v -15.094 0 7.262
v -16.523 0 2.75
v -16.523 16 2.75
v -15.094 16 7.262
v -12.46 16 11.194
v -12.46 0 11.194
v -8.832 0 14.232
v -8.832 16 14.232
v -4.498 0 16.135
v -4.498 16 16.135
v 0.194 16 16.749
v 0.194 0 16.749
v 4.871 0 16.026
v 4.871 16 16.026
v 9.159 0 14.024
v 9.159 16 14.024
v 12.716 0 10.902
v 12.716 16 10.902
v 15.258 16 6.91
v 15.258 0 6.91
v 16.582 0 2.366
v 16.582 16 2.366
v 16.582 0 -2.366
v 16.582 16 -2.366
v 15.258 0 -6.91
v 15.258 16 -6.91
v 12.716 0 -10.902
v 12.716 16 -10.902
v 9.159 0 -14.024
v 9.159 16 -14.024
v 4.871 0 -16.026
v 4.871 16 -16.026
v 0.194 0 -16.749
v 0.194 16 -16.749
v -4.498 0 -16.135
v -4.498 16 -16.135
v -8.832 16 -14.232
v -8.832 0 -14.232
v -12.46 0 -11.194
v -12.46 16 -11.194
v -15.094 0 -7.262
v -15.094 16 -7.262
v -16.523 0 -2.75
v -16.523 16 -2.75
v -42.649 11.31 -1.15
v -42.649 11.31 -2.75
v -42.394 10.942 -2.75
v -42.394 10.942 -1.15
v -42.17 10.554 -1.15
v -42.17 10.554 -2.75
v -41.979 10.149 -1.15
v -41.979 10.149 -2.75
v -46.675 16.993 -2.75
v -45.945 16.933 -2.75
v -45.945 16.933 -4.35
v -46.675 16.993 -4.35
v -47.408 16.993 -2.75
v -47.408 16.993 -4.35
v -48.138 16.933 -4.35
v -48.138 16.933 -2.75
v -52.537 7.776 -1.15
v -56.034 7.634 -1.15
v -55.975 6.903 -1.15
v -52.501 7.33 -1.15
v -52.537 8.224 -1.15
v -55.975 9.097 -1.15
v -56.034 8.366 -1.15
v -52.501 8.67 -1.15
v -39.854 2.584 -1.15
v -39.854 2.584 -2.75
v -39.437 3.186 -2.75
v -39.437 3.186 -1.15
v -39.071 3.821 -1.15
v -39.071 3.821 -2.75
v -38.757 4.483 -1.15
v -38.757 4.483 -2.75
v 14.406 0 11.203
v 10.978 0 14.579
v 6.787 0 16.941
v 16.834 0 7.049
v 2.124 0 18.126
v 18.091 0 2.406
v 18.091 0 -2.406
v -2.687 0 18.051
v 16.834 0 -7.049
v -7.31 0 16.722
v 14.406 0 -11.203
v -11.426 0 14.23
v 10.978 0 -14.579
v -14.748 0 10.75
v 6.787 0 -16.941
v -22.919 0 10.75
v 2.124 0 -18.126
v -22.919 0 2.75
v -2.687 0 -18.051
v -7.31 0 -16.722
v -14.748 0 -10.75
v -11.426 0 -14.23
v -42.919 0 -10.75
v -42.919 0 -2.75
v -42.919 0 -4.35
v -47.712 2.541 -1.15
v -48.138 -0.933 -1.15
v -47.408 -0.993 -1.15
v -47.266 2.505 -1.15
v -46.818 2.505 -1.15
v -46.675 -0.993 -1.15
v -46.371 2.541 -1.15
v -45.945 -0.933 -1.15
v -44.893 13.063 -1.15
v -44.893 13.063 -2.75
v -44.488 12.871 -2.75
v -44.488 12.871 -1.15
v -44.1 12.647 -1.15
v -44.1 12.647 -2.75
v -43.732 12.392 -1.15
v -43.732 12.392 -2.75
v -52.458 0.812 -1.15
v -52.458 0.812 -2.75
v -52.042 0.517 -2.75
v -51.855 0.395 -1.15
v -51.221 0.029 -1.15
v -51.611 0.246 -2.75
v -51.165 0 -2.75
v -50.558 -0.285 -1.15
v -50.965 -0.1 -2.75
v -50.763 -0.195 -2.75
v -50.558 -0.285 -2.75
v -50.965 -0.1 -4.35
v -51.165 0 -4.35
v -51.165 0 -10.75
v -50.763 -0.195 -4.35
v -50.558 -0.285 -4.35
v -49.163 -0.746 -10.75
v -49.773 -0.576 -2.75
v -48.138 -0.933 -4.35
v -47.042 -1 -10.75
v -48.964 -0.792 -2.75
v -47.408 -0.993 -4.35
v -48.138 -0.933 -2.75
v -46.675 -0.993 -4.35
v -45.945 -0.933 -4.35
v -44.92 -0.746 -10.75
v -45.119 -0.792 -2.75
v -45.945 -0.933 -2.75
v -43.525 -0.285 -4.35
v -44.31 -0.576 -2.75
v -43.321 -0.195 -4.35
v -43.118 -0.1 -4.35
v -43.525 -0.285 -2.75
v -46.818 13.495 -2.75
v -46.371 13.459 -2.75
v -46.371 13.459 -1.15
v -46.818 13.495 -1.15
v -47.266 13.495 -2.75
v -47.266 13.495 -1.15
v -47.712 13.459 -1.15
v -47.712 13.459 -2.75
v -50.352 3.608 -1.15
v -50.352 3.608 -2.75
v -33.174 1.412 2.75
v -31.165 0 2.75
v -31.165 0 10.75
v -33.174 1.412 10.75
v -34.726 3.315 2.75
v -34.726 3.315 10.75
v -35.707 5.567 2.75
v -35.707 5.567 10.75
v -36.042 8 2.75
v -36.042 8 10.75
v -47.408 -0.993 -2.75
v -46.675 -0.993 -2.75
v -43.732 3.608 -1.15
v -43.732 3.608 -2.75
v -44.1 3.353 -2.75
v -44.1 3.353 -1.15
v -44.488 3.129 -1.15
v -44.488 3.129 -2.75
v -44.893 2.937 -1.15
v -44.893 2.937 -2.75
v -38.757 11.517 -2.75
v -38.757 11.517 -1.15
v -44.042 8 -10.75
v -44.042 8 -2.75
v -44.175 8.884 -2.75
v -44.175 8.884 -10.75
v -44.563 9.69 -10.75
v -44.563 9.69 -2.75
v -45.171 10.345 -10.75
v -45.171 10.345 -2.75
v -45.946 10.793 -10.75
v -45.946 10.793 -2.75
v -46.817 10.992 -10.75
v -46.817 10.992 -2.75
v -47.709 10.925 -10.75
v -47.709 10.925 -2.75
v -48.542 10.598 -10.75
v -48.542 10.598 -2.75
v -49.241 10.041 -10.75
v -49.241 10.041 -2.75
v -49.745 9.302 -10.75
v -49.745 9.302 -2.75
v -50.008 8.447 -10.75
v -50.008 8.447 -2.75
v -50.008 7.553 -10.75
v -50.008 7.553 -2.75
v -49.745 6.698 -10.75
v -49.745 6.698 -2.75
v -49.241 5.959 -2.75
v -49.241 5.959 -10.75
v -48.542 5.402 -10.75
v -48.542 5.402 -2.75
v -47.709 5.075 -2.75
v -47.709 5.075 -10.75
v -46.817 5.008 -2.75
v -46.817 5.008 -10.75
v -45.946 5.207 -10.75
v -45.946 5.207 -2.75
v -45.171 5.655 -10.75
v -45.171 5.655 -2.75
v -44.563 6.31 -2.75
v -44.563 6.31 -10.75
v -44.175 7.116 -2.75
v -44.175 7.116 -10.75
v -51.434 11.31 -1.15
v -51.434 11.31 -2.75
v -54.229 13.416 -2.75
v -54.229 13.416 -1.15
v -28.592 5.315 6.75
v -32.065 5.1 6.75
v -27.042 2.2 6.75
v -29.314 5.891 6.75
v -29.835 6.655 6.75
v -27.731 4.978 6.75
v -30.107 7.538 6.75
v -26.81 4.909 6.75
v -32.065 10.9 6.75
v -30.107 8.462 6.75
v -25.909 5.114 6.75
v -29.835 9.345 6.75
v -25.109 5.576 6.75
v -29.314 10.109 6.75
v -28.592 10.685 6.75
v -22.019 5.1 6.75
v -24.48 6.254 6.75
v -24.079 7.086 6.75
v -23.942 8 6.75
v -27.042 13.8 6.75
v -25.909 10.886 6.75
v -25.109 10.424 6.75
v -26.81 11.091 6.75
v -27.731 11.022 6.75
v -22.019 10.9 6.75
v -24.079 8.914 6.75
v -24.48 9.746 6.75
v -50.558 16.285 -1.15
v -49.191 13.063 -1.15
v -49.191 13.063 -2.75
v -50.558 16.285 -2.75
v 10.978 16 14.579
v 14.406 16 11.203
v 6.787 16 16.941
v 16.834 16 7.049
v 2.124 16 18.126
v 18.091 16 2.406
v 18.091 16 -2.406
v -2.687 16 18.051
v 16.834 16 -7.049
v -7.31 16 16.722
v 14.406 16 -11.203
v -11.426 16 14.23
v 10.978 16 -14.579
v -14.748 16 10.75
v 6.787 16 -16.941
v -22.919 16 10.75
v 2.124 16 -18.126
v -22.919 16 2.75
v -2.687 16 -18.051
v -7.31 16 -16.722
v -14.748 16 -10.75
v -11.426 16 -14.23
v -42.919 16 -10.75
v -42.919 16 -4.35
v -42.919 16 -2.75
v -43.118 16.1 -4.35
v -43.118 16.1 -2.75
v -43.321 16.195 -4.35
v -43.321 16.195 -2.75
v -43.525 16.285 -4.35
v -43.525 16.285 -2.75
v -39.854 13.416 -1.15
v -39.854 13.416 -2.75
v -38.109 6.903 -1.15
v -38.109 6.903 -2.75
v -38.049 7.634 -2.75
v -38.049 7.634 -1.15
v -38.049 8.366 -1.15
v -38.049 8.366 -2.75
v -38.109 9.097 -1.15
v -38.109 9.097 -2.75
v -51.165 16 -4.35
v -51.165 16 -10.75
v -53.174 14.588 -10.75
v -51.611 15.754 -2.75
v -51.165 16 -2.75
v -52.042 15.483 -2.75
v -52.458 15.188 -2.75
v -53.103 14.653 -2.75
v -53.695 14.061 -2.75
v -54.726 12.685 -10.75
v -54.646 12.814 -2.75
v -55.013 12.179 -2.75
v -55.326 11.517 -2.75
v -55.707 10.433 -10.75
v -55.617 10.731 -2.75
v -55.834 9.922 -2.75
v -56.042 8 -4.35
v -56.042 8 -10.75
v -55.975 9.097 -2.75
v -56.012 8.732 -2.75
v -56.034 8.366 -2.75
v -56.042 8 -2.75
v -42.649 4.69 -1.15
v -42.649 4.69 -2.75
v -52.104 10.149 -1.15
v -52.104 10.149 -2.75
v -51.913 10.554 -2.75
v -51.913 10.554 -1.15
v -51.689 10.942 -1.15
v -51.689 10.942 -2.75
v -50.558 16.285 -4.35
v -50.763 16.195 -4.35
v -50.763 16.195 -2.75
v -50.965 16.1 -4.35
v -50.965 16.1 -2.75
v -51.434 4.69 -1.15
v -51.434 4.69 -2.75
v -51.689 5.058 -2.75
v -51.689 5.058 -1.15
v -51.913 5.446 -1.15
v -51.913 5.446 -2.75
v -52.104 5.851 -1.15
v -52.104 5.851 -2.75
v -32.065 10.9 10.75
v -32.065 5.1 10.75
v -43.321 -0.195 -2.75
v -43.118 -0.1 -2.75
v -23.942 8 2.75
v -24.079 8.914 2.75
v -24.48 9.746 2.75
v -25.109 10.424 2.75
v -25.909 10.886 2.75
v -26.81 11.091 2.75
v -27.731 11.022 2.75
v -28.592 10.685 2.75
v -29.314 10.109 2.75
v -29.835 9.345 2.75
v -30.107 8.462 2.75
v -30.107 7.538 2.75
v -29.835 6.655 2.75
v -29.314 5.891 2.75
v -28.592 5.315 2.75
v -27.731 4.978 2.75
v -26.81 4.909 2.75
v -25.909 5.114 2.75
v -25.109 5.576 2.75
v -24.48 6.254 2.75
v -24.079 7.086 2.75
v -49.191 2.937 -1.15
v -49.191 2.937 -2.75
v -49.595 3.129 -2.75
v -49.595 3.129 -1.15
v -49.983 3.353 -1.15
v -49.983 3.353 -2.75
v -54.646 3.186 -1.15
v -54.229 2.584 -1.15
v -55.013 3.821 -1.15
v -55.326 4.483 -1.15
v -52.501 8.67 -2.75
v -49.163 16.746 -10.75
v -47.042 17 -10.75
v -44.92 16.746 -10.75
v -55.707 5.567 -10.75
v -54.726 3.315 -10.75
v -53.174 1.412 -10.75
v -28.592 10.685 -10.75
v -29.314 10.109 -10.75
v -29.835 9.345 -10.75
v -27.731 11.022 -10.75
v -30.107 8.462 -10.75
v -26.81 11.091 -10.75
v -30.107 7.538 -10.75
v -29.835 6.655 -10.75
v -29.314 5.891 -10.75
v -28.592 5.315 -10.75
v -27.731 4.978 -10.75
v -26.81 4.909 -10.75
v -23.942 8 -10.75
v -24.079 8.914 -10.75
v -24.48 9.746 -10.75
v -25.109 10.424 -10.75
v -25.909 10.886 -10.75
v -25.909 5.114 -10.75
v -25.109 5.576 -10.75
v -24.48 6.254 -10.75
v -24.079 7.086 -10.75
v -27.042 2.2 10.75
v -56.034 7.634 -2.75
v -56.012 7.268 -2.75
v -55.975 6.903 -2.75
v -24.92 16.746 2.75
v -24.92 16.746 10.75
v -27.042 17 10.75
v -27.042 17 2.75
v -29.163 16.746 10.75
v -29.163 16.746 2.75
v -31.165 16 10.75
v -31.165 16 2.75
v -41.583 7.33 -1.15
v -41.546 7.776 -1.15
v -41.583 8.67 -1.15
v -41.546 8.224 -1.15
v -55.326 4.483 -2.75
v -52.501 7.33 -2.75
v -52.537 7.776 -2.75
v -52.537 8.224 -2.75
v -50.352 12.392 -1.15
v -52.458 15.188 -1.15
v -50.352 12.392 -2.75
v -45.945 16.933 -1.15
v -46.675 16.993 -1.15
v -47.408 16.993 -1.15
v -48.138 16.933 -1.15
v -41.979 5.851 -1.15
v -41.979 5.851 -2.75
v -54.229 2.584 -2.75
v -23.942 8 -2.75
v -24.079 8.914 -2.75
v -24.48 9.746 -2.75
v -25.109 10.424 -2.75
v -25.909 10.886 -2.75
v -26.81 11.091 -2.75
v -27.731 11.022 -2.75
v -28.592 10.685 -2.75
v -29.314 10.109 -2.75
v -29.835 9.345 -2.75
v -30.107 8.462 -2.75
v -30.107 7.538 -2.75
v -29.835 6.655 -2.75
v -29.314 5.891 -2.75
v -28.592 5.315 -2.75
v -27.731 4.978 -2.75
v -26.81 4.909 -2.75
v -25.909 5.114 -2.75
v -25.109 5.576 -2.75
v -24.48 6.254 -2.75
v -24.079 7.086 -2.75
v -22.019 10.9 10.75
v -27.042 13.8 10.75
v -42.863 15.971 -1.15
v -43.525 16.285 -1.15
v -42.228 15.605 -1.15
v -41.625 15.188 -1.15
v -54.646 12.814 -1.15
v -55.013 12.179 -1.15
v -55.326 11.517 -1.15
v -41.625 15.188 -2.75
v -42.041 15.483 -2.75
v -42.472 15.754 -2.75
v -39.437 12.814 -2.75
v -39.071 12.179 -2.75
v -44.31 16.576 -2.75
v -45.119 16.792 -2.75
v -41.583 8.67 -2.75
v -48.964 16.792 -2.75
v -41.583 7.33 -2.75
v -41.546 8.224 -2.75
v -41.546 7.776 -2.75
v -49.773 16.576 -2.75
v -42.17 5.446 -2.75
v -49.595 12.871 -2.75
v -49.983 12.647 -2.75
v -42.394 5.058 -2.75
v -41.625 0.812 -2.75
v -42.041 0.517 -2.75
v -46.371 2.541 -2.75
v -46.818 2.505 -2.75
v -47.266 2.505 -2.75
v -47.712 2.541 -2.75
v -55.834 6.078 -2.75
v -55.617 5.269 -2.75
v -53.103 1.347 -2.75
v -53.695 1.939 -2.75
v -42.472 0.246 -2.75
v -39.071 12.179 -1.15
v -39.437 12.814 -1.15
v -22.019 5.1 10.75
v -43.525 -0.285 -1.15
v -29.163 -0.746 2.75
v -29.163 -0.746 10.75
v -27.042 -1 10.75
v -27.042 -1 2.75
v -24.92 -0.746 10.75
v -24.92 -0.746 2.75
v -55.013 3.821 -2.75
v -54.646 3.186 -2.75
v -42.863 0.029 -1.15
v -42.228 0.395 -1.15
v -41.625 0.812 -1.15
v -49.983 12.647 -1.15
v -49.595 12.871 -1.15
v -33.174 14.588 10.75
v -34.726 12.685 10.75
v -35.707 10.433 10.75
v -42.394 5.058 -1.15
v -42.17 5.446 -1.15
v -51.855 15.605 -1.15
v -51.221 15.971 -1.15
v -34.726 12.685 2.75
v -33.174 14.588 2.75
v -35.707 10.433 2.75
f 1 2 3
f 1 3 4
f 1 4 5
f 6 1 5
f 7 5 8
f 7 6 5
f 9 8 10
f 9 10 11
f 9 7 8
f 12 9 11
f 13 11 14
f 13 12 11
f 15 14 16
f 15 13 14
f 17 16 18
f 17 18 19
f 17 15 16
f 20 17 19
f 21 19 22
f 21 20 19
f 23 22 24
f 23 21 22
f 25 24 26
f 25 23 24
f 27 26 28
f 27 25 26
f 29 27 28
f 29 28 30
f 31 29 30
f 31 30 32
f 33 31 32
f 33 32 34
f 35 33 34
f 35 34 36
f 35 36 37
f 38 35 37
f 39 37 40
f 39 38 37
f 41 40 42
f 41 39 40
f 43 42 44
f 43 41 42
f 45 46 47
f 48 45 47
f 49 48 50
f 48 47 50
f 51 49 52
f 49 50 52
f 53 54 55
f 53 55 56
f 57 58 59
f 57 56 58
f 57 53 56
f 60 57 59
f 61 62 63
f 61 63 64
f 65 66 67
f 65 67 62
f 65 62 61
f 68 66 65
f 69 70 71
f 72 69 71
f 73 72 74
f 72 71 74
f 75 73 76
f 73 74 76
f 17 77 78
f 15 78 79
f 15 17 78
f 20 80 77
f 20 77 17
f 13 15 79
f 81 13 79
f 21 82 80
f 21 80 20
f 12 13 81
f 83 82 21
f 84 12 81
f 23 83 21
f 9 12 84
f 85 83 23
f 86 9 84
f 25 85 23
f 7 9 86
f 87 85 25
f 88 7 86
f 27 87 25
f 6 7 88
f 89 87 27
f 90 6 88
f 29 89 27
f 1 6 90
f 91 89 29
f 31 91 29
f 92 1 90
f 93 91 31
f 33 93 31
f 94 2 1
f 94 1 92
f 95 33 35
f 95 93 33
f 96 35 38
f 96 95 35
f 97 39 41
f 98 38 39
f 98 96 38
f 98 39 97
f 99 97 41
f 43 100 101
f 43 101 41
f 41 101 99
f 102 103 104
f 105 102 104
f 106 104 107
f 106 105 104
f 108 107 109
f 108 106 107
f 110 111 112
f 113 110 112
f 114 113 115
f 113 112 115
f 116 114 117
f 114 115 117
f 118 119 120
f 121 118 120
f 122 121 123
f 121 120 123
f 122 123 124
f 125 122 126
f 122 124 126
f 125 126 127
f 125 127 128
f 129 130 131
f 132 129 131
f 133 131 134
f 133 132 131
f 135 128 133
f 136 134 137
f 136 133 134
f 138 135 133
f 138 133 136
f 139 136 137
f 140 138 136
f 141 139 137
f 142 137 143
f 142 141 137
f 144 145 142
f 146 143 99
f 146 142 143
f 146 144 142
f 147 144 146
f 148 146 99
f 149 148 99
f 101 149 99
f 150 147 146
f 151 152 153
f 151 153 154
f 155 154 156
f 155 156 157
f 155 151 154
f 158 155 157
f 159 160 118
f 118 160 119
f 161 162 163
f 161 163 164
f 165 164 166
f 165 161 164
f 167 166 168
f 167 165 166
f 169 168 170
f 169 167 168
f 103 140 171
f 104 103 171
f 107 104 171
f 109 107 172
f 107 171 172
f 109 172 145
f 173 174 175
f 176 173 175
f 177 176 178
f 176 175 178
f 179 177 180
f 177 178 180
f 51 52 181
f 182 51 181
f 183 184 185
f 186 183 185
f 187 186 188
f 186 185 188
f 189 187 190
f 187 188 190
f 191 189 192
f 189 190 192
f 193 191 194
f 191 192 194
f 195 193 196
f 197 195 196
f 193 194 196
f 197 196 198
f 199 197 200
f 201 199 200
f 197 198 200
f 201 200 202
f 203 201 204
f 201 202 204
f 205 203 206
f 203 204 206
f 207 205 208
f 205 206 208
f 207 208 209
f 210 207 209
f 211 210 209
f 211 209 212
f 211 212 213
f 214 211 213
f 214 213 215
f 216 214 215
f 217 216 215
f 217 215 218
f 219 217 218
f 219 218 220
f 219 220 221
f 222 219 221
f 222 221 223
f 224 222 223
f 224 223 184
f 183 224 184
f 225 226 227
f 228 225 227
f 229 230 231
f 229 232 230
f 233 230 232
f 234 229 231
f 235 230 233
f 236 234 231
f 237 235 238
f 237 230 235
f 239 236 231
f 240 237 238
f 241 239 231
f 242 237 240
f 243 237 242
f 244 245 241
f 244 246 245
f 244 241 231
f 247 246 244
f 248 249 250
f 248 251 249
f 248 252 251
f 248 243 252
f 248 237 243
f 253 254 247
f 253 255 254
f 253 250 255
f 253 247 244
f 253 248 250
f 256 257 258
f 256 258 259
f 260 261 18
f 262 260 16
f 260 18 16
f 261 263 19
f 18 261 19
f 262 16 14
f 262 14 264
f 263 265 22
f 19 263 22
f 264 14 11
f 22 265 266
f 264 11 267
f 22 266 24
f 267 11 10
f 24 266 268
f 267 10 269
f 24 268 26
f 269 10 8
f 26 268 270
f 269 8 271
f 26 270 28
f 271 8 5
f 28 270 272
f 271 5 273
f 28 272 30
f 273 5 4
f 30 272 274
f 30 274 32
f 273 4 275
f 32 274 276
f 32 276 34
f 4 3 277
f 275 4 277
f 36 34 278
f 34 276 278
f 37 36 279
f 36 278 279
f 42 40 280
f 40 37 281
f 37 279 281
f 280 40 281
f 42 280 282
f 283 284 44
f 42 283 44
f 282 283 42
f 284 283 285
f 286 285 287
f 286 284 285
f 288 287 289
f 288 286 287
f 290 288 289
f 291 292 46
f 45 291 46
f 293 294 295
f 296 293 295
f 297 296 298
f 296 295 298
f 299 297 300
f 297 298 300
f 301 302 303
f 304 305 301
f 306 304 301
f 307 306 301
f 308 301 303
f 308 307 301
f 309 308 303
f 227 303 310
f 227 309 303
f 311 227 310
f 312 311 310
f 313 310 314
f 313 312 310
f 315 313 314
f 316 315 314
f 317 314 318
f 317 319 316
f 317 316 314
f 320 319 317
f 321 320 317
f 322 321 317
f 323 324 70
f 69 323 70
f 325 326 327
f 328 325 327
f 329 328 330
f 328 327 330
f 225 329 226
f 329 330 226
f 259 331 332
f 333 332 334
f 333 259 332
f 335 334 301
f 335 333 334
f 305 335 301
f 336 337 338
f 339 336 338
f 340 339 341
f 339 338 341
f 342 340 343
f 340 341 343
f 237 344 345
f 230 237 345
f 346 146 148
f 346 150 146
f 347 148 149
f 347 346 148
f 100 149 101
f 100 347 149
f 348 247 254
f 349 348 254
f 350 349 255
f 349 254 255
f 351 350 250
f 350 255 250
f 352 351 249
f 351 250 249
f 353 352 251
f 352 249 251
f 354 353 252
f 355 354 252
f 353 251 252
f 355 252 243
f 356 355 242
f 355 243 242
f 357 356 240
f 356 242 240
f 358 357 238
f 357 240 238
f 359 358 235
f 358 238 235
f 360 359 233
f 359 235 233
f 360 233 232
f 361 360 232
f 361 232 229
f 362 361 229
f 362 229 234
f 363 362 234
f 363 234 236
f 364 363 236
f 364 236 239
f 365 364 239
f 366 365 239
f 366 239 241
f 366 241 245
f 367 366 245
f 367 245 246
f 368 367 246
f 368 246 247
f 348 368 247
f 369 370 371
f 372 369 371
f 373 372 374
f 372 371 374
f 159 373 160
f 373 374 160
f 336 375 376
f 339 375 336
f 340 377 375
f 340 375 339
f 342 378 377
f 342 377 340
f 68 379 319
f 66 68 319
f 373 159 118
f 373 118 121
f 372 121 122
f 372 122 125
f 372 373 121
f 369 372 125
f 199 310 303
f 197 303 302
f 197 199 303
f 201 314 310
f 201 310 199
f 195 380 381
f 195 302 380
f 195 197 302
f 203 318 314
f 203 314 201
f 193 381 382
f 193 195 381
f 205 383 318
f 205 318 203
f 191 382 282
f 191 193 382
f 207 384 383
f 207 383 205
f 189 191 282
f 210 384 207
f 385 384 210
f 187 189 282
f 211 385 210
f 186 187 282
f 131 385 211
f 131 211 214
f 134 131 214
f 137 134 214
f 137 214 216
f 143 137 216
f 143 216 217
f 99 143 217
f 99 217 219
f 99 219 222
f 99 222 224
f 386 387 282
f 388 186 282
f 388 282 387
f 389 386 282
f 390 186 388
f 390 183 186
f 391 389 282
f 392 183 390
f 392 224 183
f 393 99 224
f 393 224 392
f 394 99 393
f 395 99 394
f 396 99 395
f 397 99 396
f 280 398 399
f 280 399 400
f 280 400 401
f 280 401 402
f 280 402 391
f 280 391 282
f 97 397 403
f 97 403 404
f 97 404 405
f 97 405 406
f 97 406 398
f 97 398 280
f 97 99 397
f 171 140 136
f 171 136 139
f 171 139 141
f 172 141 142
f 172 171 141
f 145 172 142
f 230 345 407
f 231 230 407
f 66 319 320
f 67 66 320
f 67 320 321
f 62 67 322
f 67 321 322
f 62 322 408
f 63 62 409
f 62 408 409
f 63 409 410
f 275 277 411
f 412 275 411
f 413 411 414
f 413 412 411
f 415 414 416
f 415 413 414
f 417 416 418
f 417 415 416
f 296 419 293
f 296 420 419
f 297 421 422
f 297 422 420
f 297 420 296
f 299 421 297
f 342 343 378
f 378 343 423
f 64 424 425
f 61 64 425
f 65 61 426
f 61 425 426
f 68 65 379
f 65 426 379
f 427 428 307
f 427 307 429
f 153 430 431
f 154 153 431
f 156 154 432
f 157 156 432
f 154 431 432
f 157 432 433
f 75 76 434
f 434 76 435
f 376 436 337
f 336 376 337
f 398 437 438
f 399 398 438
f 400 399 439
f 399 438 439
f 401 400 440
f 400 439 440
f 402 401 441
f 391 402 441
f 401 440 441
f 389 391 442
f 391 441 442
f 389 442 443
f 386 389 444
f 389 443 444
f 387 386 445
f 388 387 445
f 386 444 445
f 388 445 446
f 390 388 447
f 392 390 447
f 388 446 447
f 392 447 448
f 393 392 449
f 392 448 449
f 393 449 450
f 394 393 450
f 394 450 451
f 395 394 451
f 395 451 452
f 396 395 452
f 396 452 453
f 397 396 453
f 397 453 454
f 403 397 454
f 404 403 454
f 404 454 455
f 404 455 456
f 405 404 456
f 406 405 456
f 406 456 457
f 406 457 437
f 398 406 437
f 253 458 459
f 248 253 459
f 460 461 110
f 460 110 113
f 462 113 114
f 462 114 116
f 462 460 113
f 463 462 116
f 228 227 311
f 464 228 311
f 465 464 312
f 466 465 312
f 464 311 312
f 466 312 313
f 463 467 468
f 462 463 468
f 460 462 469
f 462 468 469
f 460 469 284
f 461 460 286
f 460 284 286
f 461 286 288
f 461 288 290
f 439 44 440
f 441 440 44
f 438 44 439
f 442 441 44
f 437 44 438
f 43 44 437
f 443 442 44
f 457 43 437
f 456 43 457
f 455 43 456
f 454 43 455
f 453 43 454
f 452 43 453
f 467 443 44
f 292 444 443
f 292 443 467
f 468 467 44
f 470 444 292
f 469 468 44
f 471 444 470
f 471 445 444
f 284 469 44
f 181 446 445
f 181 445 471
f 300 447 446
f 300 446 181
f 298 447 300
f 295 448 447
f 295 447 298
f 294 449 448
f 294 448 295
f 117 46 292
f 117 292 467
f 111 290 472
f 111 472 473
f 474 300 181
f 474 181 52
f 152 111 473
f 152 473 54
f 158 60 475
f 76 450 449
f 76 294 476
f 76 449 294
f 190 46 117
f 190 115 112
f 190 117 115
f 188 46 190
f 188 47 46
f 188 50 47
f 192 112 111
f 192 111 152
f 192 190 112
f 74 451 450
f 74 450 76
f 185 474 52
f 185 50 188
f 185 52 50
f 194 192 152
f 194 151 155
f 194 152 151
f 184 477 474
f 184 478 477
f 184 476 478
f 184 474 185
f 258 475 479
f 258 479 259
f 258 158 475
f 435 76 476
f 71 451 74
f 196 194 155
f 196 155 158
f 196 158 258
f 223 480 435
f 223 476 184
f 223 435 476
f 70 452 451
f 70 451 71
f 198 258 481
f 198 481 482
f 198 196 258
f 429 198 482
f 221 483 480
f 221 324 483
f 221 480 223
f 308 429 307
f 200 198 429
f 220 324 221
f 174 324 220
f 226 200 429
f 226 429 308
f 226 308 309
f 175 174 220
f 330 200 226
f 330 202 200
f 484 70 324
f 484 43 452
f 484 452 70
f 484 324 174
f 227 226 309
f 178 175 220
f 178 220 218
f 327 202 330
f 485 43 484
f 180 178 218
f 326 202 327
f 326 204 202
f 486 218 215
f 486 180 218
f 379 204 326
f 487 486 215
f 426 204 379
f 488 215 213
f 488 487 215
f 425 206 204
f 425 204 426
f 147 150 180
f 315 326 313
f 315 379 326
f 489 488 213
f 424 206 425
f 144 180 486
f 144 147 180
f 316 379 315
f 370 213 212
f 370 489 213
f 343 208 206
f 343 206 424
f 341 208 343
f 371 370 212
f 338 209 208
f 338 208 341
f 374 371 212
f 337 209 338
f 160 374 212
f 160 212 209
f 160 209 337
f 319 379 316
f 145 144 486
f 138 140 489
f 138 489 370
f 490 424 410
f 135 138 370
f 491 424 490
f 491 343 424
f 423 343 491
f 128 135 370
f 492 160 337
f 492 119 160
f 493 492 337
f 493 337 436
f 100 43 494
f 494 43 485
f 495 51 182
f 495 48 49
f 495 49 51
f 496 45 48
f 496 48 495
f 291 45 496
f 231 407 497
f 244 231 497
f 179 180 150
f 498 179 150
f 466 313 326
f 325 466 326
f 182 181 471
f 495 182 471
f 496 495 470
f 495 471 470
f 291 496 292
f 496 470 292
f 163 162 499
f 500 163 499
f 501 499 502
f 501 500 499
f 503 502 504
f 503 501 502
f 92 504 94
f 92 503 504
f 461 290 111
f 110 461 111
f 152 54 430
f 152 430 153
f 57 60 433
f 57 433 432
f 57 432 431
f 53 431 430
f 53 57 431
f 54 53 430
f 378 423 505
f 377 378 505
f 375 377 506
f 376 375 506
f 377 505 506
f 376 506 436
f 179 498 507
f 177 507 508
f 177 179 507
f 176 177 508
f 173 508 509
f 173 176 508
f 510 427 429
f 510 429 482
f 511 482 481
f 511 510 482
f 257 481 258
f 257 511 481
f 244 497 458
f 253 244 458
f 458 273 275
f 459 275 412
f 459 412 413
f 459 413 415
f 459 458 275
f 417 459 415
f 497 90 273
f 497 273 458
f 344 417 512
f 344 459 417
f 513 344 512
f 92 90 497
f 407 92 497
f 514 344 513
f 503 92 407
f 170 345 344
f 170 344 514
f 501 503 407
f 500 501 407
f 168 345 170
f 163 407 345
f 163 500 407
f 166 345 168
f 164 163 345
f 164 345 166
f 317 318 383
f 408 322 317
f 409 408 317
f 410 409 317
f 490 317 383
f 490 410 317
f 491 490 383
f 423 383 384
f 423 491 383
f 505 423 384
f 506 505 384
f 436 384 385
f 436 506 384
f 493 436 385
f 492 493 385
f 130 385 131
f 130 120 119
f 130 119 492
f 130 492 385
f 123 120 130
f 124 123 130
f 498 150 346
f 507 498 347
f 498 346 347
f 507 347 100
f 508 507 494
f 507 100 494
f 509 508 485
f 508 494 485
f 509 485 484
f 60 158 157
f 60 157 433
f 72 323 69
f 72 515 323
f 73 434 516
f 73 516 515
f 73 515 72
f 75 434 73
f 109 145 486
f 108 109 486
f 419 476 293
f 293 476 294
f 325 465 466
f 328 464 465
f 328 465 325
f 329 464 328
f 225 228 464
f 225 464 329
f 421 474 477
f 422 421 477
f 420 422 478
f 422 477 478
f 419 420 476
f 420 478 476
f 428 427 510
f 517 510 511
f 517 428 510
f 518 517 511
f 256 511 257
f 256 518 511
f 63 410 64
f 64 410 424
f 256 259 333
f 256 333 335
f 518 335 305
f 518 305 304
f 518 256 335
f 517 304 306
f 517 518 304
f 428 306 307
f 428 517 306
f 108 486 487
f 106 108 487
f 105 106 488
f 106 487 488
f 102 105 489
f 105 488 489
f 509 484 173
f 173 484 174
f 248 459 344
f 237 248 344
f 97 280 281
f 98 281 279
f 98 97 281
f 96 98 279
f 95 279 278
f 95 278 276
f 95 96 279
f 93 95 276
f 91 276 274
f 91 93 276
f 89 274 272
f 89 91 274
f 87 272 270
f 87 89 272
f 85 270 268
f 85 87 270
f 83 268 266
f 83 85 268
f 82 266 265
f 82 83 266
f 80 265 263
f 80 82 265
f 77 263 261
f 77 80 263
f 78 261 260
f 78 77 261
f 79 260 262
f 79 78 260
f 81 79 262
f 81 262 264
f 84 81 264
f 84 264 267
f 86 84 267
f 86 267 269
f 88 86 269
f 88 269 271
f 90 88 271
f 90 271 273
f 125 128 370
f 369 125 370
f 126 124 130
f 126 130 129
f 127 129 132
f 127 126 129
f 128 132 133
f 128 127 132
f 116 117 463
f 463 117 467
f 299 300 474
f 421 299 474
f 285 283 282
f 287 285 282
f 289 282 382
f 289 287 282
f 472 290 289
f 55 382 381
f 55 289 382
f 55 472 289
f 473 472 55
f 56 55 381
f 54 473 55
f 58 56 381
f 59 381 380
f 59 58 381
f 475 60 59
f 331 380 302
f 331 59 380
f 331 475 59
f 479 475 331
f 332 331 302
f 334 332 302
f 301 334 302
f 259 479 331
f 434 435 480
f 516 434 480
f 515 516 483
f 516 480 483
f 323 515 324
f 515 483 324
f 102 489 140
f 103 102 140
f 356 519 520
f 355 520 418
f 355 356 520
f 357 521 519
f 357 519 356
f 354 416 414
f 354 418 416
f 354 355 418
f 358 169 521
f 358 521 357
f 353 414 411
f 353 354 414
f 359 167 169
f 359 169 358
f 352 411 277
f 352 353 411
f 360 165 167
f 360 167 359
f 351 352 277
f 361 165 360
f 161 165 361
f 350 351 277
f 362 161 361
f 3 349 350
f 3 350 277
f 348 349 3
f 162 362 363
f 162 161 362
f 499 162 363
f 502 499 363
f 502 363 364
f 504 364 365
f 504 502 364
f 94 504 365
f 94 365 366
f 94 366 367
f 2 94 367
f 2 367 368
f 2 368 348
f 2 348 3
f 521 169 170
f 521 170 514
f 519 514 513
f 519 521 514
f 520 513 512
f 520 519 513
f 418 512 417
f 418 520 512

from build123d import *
from build123d.topology import SkipClean

# Parameters (mm, degrees)
SALIENTE_EXTRUIR1_DEPTH = 16
CROQUIS2_R              = 3.1
CORTAR_EXTRUIR1_DEPTH   = 500
CROQUIS3_R              = 9
CROQUIS3_R_2            = 3.1
SALIENTE_EXTRUIR2_DEPTH = 8
CORTAR_EXTRUIR2_DEPTH   = 4
CROQUIS7_R              = 9
SALIENTE_EXTRUIR3_DEPTH = 8
SALIENTE_EXTRUIR4_DEPTH = 1.6
CROQUIS9_R              = 3
CORTAR_EXTRUIR3_DEPTH   = 10
CORTAR_EXTRUIR4_START   = -8
CORTAR_EXTRUIR4_DEPTH   = 8
CORTAR_EXTRUIR6_START   = -8
CORTAR_EXTRUIR6_DEPTH   = 8


# Read off the part's stored shape, not the designer's step: Cortar-Extruir4, Cortar-Extruir6
with BuildPart() as part:
    # Croquis1 → Saliente-Extruir1 (new body)
    with BuildSketch(Plane(origin=(0, 0, 0), x_dir=(1, 0, 0), z_dir=(0, 1, 0))):
        with BuildLine():
            Line((-18.041618553, 2.75), (-56.041618553, 2.75))
            Line((-56.041618553, 2.75), (-56.041618553, 10.75))
            Line((-56.041618553, 10.75), (-14.747881204, 10.75))
            ThreePointArc((-14.747881204, 10.75), (18.25, 0), (-14.747881204, -10.75))
            Line((-14.747881204, -10.75), (-36.041618553, -10.75))
            Line((-36.041618553, -10.75), (-36.041618553, -2.75))
            Line((-36.041618553, -2.75), (-18.041618553, -2.75))
            Line((-18.041618553, -2.75), (-16.522711642, -2.75))
            ThreePointArc((-16.522711642, -2.75), (16.75, 0), (-16.522711642, 2.75))
            Line((-16.522711642, 2.75), (-18.041618553, 2.75))
        make_face()
    extrude(amount=SALIENTE_EXTRUIR1_DEPTH)

    # Croquis2 → Cortar-Extruir1 (cut)
    with BuildSketch(Plane.XY.offset(10.75)):
        with Locations((-27.041618553, 8)):
            Circle(CROQUIS2_R)
    extrude(amount=-CORTAR_EXTRUIR1_DEPTH, mode=Mode.SUBTRACT)

    # Croquis3 → Saliente-Extruir2 (add)
    with BuildSketch(Plane.XY.offset(10.75)):
        with Locations((-27.041618553, 8)):
            Circle(CROQUIS3_R)
        with Locations((-27.041618553, 8)):
            Circle(CROQUIS3_R_2, mode=Mode.SUBTRACT)
    extrude(amount=-SALIENTE_EXTRUIR2_DEPTH)

    # Croquis5 → Cortar-Extruir2 (cut)
    with BuildSketch(Plane.XY.offset(10.75)):
        Polygon((-27.041618553, 2.2), (-22.018671211, 5.1), (-22.018671211, 10.9), (-27.041618553, 13.8), (-32.064565895, 10.9), (-32.064565895, 5.1), align=None)
    extrude(amount=-CORTAR_EXTRUIR2_DEPTH, mode=Mode.SUBTRACT)

    # Croquis7 → Saliente-Extruir3 (add)
    with BuildSketch(Plane.XY.offset(-2.75)):
        with Locations((-47.041618553, 8)):
            Circle(CROQUIS7_R)
    extrude(amount=-SALIENTE_EXTRUIR3_DEPTH)

    # Croquis8 → Saliente-Extruir4 (add, symmetric)
    with SkipClean():  # the faces are left unmerged after this step: merging them gives an invalid solid
        with BuildSketch(Plane.XY.offset(-2.75)):
            with BuildLine():
                Line((-47.711899941, 13.459003834), (-48.138442643, 16.932915365))
                ThreePointArc((-48.138442643, 16.932915365), (-47.041618553, 17), (-45.944794462, 16.932915365))
                Line((-45.944794462, 16.932915365), (-46.371337164, 13.459003834))
                ThreePointArc((-46.371337164, 13.459003834), (-47.041618553, 13.5), (-47.711899941, 13.459003834))
            make_face()
            with BuildLine():
                Line((-43.731635925, 12.392495305), (-41.625283344, 15.18771959))
                ThreePointArc((-41.625283344, 15.18771959), (-42.541618553, 15.794228634), (-43.525038396, 16.284543681))
                Line((-43.525038396, 16.284543681), (-44.892597346, 13.062776694))
                ThreePointArc((-44.892597346, 13.062776694), (-44.291618553, 12.763139721), (-43.731635925, 12.392495305))
            make_face()
            with BuildLine():
                Line((-41.978841859, 10.149021207), (-38.757074872, 11.516580156))
                ThreePointArc((-38.757074872, 11.516580156), (-39.247389919, 12.5), (-39.853898962, 13.416335208))
                Line((-39.853898962, 13.416335208), (-42.649123247, 11.309982627))
                ThreePointArc((-42.649123247, 11.309982627), (-42.278478832, 10.75), (-41.978841859, 10.149021207))
            make_face()
            with BuildLine():
                Line((-41.582614719, 7.329718611), (-38.108703188, 6.903175909))
                ThreePointArc((-38.108703188, 6.903175909), (-38.041618553, 8), (-38.108703188, 9.096824091))
                Line((-38.108703188, 9.096824091), (-41.582614719, 8.670281389))
                ThreePointArc((-41.582614719, 8.670281389), (-41.541618553, 8), (-41.582614719, 7.329718611))
            make_face()
            with BuildLine():
                Line((-42.649123247, 4.690017373), (-39.853898962, 2.583664792))
                ThreePointArc((-39.853898962, 2.583664792), (-39.247389919, 3.5), (-38.757074872, 4.483419844))
                Line((-38.757074872, 4.483419844), (-41.978841859, 5.850978793))
                ThreePointArc((-41.978841859, 5.850978793), (-42.278478832, 5.25), (-42.649123247, 4.690017373))
            make_face()
            with BuildLine():
                Line((-44.892597346, 2.937223306), (-43.525038396, -0.284543681))
                ThreePointArc((-43.525038396, -0.284543681), (-42.541618553, 0.205771366), (-41.625283344, 0.81228041))
                Line((-41.625283344, 0.81228041), (-43.731635925, 3.607504695))
                ThreePointArc((-43.731635925, 3.607504695), (-44.291618553, 3.236860279), (-44.892597346, 2.937223306))
            make_face()
            with BuildLine():
                Line((-47.711899941, 2.540996166), (-48.138442643, -0.932915365))
                ThreePointArc((-48.138442643, -0.932915365), (-47.041618553, -1), (-45.944794462, -0.932915365))
                Line((-45.944794462, -0.932915365), (-46.371337164, 2.540996166))
                ThreePointArc((-46.371337164, 2.540996166), (-47.041618553, 2.5), (-47.711899941, 2.540996166))
            make_face()
            with BuildLine():
                Line((-50.35160118, 3.607504695), (-52.457953761, 0.81228041))
                ThreePointArc((-52.457953761, 0.81228041), (-51.541618553, 0.205771366), (-50.558198709, -0.284543681))
                Line((-50.558198709, -0.284543681), (-49.190639759, 2.937223306))
                ThreePointArc((-49.190639759, 2.937223306), (-49.791618553, 3.236860279), (-50.35160118, 3.607504695))
            make_face()
            with BuildLine():
                Line((-52.104395247, 5.850978793), (-55.326162234, 4.483419844))
                ThreePointArc((-55.326162234, 4.483419844), (-54.835847187, 3.5), (-54.229338143, 2.583664792))
                Line((-54.229338143, 2.583664792), (-51.434113858, 4.690017373))
                ThreePointArc((-51.434113858, 4.690017373), (-51.804758273, 5.25), (-52.104395247, 5.850978793))
            make_face()
            with BuildLine():
                Line((-52.500622387, 8.670281389), (-55.974533917, 9.096824091))
                ThreePointArc((-55.974533917, 9.096824091), (-56.041618553, 8), (-55.974533917, 6.903175909))
                Line((-55.974533917, 6.903175909), (-52.500622387, 7.329718611))
                ThreePointArc((-52.500622387, 7.329718611), (-52.541618553, 8), (-52.500622387, 8.670281389))
            make_face()
            with BuildLine():
                Line((-51.434113858, 11.309982627), (-54.229338143, 13.416335208))
                ThreePointArc((-54.229338143, 13.416335208), (-54.835847187, 12.5), (-55.326162234, 11.516580156))
                Line((-55.326162234, 11.516580156), (-52.104395247, 10.149021207))
                ThreePointArc((-52.104395247, 10.149021207), (-51.804758273, 10.75), (-51.434113858, 11.309982627))
            make_face()
            with BuildLine():
                Line((-49.190639759, 13.062776694), (-50.558198709, 16.284543681))
                ThreePointArc((-50.558198709, 16.284543681), (-51.541618553, 15.794228634), (-52.457953761, 15.18771959))
                Line((-52.457953761, 15.18771959), (-50.35160118, 12.392495305))
                ThreePointArc((-50.35160118, 12.392495305), (-49.791618553, 12.763139721), (-49.190639759, 13.062776694))
            make_face()
        extrude(amount=SALIENTE_EXTRUIR4_DEPTH, both=True)

    # Croquis9 → Cortar-Extruir3 (cut)
    with SkipClean():  # the faces are left unmerged after this step: merging them gives an invalid solid
        with BuildSketch(Plane.XY.offset(-2.75)):
            with Locations((-47.041618553, 8)):
                Circle(CROQUIS9_R)
        extrude(amount=-CORTAR_EXTRUIR3_DEPTH, mode=Mode.SUBTRACT)

    # Cortar-Extruir4 outline → Cortar-Extruir4 (cut)
    with SkipClean():  # the faces are left unmerged after this step: merging them gives an invalid solid
        with BuildSketch(Plane(origin=(0, 0, -10.75), x_dir=(-1, 0, 0), z_dir=(0, 0, -1)).offset(CORTAR_EXTRUIR4_START)):
            with BuildLine():
                Line((56.041618553, 16), (51.164724178, 16))
                ThreePointArc((51.164724178, 16), (54.726276991, 12.684658439), (56.041618553, 8))
                Line((56.041618553, 8), (56.041618553, 16))
            make_face()
            with BuildLine():
                Line((56.041618553, 0), (56.041618553, 8))
                ThreePointArc((56.041618553, 8), (54.726276991, 3.315341561), (51.164724178, 0))
                Line((51.164724178, 0), (56.041618553, 0))
            make_face()
        extrude(amount=CORTAR_EXTRUIR4_DEPTH, mode=Mode.SUBTRACT)

    # Cortar-Extruir6 outline → Cortar-Extruir6 (cut)
    with SkipClean():  # the faces are left unmerged after this step: merging them gives an invalid solid
        with BuildSketch(Plane.XY.offset(10.75).offset(CORTAR_EXTRUIR6_START)):
            with BuildLine():
                ThreePointArc((-31.164724178, 0), (-34.726276991, 3.315341561), (-36.041618553, 8))
                Line((-36.041618553, 8), (-36.041618553, 0))
                Line((-36.041618553, 0), (-31.164724178, 0))
            make_face()
            with BuildLine():
                ThreePointArc((-36.041618553, 8), (-34.726276991, 12.684658439), (-31.164724178, 16))
                Line((-31.164724178, 16), (-36.041618553, 16))
                Line((-36.041618553, 16), (-36.041618553, 8))
            make_face()
        extrude(amount=CORTAR_EXTRUIR6_DEPTH, mode=Mode.SUBTRACT)


solid = part.part
